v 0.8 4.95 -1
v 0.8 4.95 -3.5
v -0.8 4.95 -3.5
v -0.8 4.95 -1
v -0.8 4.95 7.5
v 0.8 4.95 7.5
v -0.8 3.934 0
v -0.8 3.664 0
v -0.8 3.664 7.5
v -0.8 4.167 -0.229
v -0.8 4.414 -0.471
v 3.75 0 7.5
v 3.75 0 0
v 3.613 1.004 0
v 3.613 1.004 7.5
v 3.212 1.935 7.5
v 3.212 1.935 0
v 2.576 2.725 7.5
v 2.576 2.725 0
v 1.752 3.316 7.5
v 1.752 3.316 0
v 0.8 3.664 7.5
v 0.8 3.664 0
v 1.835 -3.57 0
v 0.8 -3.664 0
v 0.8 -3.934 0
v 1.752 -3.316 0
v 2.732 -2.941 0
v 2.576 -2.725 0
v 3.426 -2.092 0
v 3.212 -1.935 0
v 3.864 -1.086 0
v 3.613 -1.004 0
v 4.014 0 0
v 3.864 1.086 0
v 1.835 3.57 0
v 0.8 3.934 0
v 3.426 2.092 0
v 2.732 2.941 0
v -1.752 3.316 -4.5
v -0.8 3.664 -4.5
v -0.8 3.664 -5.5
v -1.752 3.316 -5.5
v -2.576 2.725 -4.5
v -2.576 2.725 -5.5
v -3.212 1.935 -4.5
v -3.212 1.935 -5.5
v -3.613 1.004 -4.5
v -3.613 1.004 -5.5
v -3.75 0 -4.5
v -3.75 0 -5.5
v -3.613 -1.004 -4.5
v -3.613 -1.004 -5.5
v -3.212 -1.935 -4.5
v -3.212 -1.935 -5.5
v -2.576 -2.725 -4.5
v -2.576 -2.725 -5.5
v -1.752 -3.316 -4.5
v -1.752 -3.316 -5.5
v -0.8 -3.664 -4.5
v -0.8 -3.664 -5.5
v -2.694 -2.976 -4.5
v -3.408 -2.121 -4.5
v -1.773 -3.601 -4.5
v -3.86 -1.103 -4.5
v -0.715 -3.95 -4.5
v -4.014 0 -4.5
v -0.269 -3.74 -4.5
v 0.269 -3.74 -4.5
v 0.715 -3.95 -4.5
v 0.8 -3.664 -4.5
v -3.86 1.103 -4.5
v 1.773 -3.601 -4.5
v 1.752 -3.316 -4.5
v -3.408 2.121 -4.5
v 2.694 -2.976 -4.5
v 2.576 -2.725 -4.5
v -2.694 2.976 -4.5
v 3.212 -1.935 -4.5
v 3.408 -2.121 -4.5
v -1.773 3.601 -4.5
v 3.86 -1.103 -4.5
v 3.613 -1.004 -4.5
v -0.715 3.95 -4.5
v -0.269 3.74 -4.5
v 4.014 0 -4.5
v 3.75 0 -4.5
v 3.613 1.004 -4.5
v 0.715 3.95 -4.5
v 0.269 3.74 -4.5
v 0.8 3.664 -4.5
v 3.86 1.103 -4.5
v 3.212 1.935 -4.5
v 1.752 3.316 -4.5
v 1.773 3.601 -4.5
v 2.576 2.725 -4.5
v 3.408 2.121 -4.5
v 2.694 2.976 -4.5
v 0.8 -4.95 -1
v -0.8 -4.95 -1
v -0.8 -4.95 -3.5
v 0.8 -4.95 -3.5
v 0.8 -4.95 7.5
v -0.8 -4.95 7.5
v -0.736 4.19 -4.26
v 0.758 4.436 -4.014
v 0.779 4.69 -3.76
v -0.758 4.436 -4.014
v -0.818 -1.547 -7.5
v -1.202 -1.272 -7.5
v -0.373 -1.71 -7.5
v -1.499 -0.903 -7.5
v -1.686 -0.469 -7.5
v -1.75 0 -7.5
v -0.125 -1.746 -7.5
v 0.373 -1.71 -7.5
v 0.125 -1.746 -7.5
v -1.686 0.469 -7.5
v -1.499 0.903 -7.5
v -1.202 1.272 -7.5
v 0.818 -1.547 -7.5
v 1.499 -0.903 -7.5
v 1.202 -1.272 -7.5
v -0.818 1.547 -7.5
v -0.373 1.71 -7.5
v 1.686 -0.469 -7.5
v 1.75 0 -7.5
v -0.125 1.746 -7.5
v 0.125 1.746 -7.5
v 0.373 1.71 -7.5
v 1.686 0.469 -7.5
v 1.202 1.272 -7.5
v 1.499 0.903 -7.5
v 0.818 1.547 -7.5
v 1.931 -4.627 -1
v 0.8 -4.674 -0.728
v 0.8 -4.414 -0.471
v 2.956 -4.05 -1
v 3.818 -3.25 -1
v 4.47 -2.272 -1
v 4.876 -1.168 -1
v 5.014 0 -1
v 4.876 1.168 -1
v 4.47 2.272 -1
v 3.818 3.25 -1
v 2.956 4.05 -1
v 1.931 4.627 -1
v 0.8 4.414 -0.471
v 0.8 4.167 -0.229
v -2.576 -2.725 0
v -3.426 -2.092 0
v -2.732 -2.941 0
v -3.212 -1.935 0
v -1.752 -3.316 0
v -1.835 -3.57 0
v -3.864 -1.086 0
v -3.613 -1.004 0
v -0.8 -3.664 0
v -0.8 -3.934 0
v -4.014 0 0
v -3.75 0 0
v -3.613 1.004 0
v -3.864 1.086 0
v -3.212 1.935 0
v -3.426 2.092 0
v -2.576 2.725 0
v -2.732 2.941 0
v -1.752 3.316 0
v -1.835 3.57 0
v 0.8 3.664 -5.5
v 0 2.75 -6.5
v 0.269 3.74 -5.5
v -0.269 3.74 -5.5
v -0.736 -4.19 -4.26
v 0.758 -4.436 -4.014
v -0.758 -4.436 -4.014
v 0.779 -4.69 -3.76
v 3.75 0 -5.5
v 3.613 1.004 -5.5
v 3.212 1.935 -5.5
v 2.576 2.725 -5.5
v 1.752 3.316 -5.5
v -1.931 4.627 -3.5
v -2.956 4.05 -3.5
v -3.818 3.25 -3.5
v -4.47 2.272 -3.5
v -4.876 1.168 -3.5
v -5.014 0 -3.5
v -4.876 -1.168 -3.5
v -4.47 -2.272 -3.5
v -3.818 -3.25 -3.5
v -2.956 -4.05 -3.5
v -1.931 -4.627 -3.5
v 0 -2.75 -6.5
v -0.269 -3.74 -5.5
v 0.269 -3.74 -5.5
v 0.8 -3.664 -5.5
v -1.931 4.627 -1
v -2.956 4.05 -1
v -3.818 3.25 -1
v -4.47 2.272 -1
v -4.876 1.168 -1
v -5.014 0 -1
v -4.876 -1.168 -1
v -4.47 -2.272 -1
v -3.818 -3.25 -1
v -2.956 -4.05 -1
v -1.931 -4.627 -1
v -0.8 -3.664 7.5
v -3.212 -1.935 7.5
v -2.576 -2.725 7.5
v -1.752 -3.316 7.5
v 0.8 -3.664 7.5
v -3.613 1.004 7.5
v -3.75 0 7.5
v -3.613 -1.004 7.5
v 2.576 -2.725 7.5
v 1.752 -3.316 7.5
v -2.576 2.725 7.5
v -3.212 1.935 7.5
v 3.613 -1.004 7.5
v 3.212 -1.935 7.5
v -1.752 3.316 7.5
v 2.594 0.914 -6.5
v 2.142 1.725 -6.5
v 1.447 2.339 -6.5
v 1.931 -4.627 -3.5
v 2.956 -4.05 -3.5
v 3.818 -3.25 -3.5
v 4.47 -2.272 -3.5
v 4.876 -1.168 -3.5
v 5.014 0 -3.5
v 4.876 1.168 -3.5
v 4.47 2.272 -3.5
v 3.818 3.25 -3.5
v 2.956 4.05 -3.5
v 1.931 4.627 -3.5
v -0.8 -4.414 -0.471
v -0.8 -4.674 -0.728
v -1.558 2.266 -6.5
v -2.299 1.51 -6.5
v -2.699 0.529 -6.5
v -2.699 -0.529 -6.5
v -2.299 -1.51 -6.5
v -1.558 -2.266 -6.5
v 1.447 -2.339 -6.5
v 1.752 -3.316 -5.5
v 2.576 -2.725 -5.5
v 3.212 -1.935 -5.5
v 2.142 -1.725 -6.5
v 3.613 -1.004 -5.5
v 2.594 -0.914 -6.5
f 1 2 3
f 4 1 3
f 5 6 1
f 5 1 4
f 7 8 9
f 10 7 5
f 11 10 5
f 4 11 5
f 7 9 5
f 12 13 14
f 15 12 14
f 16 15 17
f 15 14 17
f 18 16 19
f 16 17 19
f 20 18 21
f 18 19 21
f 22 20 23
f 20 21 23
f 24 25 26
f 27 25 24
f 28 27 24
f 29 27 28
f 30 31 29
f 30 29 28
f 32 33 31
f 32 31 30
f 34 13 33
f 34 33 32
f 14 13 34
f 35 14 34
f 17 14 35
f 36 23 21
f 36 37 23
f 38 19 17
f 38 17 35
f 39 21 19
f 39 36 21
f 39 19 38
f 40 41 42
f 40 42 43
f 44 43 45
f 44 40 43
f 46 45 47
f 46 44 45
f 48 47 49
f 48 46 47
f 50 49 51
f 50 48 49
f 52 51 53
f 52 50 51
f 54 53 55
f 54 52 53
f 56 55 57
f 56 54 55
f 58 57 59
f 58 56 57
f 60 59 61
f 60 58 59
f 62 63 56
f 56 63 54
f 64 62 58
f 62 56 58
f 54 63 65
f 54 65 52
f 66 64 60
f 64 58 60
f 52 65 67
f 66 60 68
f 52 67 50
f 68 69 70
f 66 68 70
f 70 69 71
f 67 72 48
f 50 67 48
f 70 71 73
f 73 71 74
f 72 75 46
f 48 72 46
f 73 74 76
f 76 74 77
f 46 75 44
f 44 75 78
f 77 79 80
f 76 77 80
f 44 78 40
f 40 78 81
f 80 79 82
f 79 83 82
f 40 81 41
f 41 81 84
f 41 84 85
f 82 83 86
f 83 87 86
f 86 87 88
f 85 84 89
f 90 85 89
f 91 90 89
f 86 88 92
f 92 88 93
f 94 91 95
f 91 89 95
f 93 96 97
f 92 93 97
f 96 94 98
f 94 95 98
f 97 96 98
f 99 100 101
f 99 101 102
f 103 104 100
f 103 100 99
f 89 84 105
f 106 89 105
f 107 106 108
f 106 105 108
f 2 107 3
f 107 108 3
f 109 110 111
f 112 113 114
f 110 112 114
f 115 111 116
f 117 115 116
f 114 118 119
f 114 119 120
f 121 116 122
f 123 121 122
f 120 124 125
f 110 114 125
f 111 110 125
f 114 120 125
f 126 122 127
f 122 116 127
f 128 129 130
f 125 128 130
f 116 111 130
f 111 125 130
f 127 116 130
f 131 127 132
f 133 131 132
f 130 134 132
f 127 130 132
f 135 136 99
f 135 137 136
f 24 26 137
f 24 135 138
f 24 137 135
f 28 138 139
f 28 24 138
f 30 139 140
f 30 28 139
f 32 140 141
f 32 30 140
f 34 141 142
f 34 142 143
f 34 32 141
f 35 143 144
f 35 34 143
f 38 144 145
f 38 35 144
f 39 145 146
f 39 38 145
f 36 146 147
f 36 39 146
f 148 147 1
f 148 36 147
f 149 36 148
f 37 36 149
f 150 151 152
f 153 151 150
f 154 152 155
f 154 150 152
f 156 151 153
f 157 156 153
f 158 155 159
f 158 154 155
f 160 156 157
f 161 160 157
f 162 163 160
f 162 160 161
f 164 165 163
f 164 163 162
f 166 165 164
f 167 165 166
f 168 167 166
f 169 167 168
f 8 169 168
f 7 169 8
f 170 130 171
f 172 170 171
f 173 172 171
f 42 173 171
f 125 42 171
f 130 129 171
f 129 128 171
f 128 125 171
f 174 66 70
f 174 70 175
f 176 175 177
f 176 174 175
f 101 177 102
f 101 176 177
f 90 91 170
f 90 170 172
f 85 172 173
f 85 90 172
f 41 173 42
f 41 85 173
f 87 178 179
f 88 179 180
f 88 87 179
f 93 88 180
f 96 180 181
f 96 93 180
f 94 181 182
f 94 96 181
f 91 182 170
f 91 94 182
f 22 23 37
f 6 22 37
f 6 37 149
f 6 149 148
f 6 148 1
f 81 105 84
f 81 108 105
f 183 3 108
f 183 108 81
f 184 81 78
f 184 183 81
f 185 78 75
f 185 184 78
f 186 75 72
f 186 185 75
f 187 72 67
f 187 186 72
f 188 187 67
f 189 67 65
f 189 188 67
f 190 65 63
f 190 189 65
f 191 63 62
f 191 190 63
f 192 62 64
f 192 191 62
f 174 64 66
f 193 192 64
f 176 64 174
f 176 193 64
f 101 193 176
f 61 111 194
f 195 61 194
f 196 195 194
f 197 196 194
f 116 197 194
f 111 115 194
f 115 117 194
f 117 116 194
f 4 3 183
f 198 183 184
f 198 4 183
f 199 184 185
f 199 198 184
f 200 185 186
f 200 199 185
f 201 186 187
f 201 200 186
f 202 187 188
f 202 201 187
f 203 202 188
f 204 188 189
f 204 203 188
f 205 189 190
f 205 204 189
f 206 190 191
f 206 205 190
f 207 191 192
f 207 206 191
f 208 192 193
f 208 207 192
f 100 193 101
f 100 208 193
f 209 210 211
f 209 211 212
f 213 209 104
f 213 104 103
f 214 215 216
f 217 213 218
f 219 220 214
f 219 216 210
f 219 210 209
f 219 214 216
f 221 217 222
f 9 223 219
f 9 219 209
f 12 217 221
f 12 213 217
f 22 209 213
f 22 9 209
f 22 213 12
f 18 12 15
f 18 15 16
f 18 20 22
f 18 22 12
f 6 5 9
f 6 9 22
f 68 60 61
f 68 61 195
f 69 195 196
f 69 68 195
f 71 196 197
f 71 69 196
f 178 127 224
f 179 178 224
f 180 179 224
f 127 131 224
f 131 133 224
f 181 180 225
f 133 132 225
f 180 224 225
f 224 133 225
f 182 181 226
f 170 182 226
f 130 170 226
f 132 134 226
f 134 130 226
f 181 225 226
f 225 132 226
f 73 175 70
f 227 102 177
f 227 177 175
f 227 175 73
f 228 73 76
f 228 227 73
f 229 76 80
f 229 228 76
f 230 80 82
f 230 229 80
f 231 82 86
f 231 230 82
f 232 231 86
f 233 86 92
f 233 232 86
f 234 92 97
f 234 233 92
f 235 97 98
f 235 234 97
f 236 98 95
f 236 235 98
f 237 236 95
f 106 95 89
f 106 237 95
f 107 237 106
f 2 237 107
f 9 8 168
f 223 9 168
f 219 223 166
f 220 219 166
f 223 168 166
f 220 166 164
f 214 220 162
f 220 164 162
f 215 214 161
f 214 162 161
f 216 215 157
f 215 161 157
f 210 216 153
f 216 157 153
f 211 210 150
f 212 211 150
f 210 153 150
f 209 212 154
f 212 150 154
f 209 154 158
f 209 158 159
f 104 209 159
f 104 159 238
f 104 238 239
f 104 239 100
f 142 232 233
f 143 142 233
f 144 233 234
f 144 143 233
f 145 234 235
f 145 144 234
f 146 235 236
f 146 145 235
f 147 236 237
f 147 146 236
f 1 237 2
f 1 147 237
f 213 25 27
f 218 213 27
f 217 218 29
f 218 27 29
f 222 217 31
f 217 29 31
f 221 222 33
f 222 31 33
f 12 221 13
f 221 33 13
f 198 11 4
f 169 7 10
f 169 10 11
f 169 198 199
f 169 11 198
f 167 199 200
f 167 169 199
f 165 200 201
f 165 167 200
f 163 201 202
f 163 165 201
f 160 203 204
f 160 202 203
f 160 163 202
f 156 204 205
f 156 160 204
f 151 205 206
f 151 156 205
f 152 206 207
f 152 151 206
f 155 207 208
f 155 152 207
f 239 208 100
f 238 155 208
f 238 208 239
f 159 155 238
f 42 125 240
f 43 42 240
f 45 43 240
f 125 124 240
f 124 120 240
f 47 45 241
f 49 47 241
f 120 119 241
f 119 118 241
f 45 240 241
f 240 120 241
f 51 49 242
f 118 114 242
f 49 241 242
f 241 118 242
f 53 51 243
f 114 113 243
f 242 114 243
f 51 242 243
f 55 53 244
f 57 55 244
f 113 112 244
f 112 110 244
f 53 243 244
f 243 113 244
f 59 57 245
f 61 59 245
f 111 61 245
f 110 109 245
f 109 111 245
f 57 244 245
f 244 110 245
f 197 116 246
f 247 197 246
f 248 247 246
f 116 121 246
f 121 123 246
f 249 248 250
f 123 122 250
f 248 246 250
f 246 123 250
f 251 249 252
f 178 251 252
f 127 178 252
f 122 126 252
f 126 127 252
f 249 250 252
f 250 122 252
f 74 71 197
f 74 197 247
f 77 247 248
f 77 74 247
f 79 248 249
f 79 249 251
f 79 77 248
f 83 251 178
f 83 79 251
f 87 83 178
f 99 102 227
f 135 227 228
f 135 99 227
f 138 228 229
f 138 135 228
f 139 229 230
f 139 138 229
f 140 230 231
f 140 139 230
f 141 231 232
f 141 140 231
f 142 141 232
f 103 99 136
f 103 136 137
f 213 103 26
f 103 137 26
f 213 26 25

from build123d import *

# Parameters (mm, degrees)
F1_DEPTH     = 7.5
F2_DEPTH     = 7.5
F3_DEPTH     = 4.5
F4_SIZE      = 2
F5_T1_DEPTH  = 6.7433659759
F5_T4_ANGLE  = 220.4864882976
F5_T6_ANGLE  = 220.4864882976
F5_T10_ANGLE = 220.4864882976
F5_T15_ANGLE = 220.4864882976
F5_T20_ANGLE = 220.4864882976
F5_T25_ANGLE = 220.4864882976


# Not quite as in the source:
# - a fillet or chamfer that OpenCascade refuses, or shapes differently, is made with other operations: its cross-section is extruded or revolved along the edge and cut away or added


with BuildPart() as f1:
    # F0 (on Top) → F1 (new body)
    with BuildSketch(Plane.XY):
        with BuildLine():
            ThreePointArc((0.8, -3.6636730203), (2.9208303614, -2.3518609653), (3.75, 0))
            ThreePointArc((3.75, 0), (2.9208303614, 2.3518609653), (0.8, 3.6636730203))
            Line((0.8, 3.6636730203), (0.8, -3.6636730203))
        make_face()
        with BuildLine():
            Line((0.8, -3.6636730203), (0.8, 3.6636730203))
            ThreePointArc((0.8, 3.6636730203), (0, 3.75), (-0.8, 3.6636730203))
            Line((-0.8, 3.6636730203), (-0.8, -3.6636730203))
            ThreePointArc((-0.8, -3.6636730203), (0, -3.75), (0.8, -3.6636730203))
        make_face()
        with BuildLine():
            Line((-0.8, -3.6636730203), (-0.8, 3.6636730203))
            ThreePointArc((-0.8, 3.6636730203), (-3.75, 0), (-0.8, -3.6636730203))
        make_face()
    extrude(amount=-F1_DEPTH)

    # F0 (on Top) → F2 (join)
    with BuildSketch(Plane.XY):
        with BuildLine():
            ThreePointArc((0.8, -3.6636730203), (2.9208303614, -2.3518609653), (3.75, 0))
            ThreePointArc((3.75, 0), (2.9208303614, 2.3518609653), (0.8, 3.6636730203))
            Line((0.8, 3.6636730203), (0.8, -3.6636730203))
        make_face()
        with BuildLine():
            Line((0.8, -3.6636730203), (0.8, 3.6636730203))
            ThreePointArc((0.8, 3.6636730203), (0, 3.75), (-0.8, 3.6636730203))
            Line((-0.8, 3.6636730203), (-0.8, -3.6636730203))
            ThreePointArc((-0.8, -3.6636730203), (0, -3.75), (0.8, -3.6636730203))
        make_face()
        with BuildLine():
            Line((-0.8, -3.6636730203), (-0.8, 3.6636730203))
            ThreePointArc((-0.8, 3.6636730203), (-3.75, 0), (-0.8, -3.6636730203))
        make_face()
        with BuildLine():
            ThreePointArc((-0.8, 3.6636730203), (0, 3.75), (0.8, 3.6636730203))
            Line((0.8, 3.6636730203), (0.8, 4.95))
            Line((0.8, 4.95), (-0.8, 4.95))
            Line((-0.8, 4.95), (-0.8, 3.6636730203))
        make_face()
        with BuildLine():
            Line((0.8, -4.95), (0.8, -3.6636730203))
            ThreePointArc((0.8, -3.6636730203), (0, -3.75), (-0.8, -3.6636730203))
            Line((-0.8, -3.6636730203), (-0.8, -4.95))
            Line((-0.8, -4.95), (0.8, -4.95))
        make_face()
    extrude(amount=F2_DEPTH)

    # F0 (on Top) → F3 (join)
    with BuildSketch(Plane.XY):
        with BuildLine():
            ThreePointArc((0.8, 3.6636730203), (2.9208303614, 2.3518609653), (3.75, 0))
            ThreePointArc((3.75, 0), (2.9208303614, -2.3518609653), (0.8, -3.6636730203))
            Line((0.8, -3.6636730203), (0.8, -4.95))
            ThreePointArc((0.8, -4.95), (3.8179761524, -3.2504704428), (5.0142297514, 0))
            ThreePointArc((5.0142297514, 0), (3.8179761524, 3.2504704428), (0.8, 4.95))
            Line((0.8, 4.95), (0.8, 3.6636730203))
        make_face()
        with BuildLine():
            Line((0.8, -4.95), (0.8, -3.6636730203))
            ThreePointArc((0.8, -3.6636730203), (0, -3.75), (-0.8, -3.6636730203))
            Line((-0.8, -3.6636730203), (-0.8, -4.95))
            Line((-0.8, -4.95), (0.8, -4.95))
        make_face()
        with BuildLine():
            ThreePointArc((-0.8, -3.6636730203), (-3.75, 0), (-0.8, 3.6636730203))
            Line((-0.8, 3.6636730203), (-0.8, 4.95))
            ThreePointArc((-0.8, 4.95), (-5.0142297514, 0), (-0.8, -4.95))
            Line((-0.8, -4.95), (-0.8, -3.6636730203))
        make_face()
        with BuildLine():
            ThreePointArc((-0.8, 3.6636730203), (0, 3.75), (0.8, 3.6636730203))
            Line((0.8, 3.6636730203), (0.8, 4.95))
            Line((0.8, 4.95), (-0.8, 4.95))
            Line((-0.8, 4.95), (-0.8, 3.6636730203))
        make_face()
    extrude(amount=-F3_DEPTH)

    # F4
    f4_edges = [f1.edges().sort_by_distance(p)[0] for p in [
        (0.8, -3.663673, -7.5),
    ]]
    chamfer(f4_edges, length=F4_SIZE)

    # F5: chamfer of 1 on 6 edges, made by hand

    # F5_s2 → F5_t1 (cut)
    with BuildSketch(Plane.YZ.offset(-3.371682988)):
        Polygon((-3.95, -4.5), (-4.95, -3.5), (-4.95, -4.5), align=None)
        Polygon((3.95, -4.5), (4.95, -3.5), (4.95, -4.5), align=None)
    extrude(amount=F5_T1_DEPTH, mode=Mode.SUBTRACT)

    # F5_s3 → F5_t4 (revolve, cut)
    with BuildSketch(Plane(origin=(0, 0, 0), x_dir=(0, 0, 1), z_dir=(0.9382321407, -0.3460064308, 0))):
        Polygon((-4.5, -4.0142297514), (-3.5, -5.0142297514), (-4.5, -5.0142297514), align=None)
    revolve(axis=Axis((0, 0, -4.5), (0, 0, 1)), revolution_arc=F5_T4_ANGLE, mode=Mode.SUBTRACT)

    # F5_s5 → F5_t6 (revolve, cut)
    with BuildSketch(Plane(origin=(0, 0, 0), x_dir=(0, 0, 1), z_dir=(-0.9382321407, 0.3460064308, 0))):
        Polygon((-4.5, -4.0142297514), (-3.5, -5.0142297514), (-4.5, -5.0142297514), align=None)
    revolve(axis=Axis((0, 0, -4.5), (0, 0, 1)), revolution_arc=F5_T6_ANGLE, mode=Mode.SUBTRACT)


with BuildPart() as f5_tool8:
    # F5_s9 → F5_t10 (revolve)
    with BuildSketch(Plane(origin=(0, 0, 0), x_dir=(0, 0, 1), z_dir=(0.9382321407, -0.3460064308, 0))):
        Polygon((-1, -5.0142297514), (0, -4.0142297514), (0, -5.0142297514), align=None)
    revolve(axis=Axis((0, 0, 0), (0, 0, 1)), revolution_arc=F5_T10_ANGLE)

    split(bisect_by=Plane.YZ.offset(0.8), keep=Keep.TOP)


with BuildPart() as f1_1:
    add(f1.part)

    # F5_t7: cut F5_tool8
    add(f5_tool8.part, mode=Mode.SUBTRACT)


with BuildPart() as f5_tool13:
    # F5_s14 → F5_t15 (revolve)
    with BuildSketch(Plane(origin=(0, 0, 0), x_dir=(0, 0, 1), z_dir=(0.9382321407, -0.3460064308, 0))):
        Polygon((-1, -5.0142297514), (0, -4.0142297514), (0, -5.0142297514), align=None)
    revolve(axis=Axis((0, 0, 0), (0, 0, 1)), revolution_arc=F5_T15_ANGLE)

    split(bisect_by=Plane.YZ.offset(-0.8), keep=Keep.BOTTOM)


with BuildPart() as f1_2:
    add(f1_1.part)

    # F5_t12: cut F5_tool13
    add(f5_tool13.part, mode=Mode.SUBTRACT)


with BuildPart() as f5_tool18:
    # F5_s19 → F5_t20 (revolve)
    with BuildSketch(Plane(origin=(0, 0, 0), x_dir=(0, 0, 1), z_dir=(-0.9382321407, 0.3460064308, 0))):
        Polygon((-1, -5.0142297514), (0, -4.0142297514), (0, -5.0142297514), align=None)
    revolve(axis=Axis((0, 0, 0), (0, 0, 1)), revolution_arc=F5_T20_ANGLE)

    split(bisect_by=Plane.YZ.offset(-0.8), keep=Keep.BOTTOM)


with BuildPart() as f1_3:
    add(f1_2.part)

    # F5_t17: cut F5_tool18
    add(f5_tool18.part, mode=Mode.SUBTRACT)


with BuildPart() as f5_tool23:
    # F5_s24 → F5_t25 (revolve)
    with BuildSketch(Plane(origin=(0, 0, 0), x_dir=(0, 0, 1), z_dir=(-0.9382321407, 0.3460064308, 0))):
        Polygon((-1, -5.0142297514), (0, -4.0142297514), (0, -5.0142297514), align=None)
    revolve(axis=Axis((0, 0, 0), (0, 0, 1)), revolution_arc=F5_T25_ANGLE)

    split(bisect_by=Plane.YZ.offset(0.8), keep=Keep.TOP)


with BuildPart() as f1_4:
    add(f1_3.part)

    # F5_t22: cut F5_tool23
    add(f5_tool23.part, mode=Mode.SUBTRACT)


solid = f1_4.part
